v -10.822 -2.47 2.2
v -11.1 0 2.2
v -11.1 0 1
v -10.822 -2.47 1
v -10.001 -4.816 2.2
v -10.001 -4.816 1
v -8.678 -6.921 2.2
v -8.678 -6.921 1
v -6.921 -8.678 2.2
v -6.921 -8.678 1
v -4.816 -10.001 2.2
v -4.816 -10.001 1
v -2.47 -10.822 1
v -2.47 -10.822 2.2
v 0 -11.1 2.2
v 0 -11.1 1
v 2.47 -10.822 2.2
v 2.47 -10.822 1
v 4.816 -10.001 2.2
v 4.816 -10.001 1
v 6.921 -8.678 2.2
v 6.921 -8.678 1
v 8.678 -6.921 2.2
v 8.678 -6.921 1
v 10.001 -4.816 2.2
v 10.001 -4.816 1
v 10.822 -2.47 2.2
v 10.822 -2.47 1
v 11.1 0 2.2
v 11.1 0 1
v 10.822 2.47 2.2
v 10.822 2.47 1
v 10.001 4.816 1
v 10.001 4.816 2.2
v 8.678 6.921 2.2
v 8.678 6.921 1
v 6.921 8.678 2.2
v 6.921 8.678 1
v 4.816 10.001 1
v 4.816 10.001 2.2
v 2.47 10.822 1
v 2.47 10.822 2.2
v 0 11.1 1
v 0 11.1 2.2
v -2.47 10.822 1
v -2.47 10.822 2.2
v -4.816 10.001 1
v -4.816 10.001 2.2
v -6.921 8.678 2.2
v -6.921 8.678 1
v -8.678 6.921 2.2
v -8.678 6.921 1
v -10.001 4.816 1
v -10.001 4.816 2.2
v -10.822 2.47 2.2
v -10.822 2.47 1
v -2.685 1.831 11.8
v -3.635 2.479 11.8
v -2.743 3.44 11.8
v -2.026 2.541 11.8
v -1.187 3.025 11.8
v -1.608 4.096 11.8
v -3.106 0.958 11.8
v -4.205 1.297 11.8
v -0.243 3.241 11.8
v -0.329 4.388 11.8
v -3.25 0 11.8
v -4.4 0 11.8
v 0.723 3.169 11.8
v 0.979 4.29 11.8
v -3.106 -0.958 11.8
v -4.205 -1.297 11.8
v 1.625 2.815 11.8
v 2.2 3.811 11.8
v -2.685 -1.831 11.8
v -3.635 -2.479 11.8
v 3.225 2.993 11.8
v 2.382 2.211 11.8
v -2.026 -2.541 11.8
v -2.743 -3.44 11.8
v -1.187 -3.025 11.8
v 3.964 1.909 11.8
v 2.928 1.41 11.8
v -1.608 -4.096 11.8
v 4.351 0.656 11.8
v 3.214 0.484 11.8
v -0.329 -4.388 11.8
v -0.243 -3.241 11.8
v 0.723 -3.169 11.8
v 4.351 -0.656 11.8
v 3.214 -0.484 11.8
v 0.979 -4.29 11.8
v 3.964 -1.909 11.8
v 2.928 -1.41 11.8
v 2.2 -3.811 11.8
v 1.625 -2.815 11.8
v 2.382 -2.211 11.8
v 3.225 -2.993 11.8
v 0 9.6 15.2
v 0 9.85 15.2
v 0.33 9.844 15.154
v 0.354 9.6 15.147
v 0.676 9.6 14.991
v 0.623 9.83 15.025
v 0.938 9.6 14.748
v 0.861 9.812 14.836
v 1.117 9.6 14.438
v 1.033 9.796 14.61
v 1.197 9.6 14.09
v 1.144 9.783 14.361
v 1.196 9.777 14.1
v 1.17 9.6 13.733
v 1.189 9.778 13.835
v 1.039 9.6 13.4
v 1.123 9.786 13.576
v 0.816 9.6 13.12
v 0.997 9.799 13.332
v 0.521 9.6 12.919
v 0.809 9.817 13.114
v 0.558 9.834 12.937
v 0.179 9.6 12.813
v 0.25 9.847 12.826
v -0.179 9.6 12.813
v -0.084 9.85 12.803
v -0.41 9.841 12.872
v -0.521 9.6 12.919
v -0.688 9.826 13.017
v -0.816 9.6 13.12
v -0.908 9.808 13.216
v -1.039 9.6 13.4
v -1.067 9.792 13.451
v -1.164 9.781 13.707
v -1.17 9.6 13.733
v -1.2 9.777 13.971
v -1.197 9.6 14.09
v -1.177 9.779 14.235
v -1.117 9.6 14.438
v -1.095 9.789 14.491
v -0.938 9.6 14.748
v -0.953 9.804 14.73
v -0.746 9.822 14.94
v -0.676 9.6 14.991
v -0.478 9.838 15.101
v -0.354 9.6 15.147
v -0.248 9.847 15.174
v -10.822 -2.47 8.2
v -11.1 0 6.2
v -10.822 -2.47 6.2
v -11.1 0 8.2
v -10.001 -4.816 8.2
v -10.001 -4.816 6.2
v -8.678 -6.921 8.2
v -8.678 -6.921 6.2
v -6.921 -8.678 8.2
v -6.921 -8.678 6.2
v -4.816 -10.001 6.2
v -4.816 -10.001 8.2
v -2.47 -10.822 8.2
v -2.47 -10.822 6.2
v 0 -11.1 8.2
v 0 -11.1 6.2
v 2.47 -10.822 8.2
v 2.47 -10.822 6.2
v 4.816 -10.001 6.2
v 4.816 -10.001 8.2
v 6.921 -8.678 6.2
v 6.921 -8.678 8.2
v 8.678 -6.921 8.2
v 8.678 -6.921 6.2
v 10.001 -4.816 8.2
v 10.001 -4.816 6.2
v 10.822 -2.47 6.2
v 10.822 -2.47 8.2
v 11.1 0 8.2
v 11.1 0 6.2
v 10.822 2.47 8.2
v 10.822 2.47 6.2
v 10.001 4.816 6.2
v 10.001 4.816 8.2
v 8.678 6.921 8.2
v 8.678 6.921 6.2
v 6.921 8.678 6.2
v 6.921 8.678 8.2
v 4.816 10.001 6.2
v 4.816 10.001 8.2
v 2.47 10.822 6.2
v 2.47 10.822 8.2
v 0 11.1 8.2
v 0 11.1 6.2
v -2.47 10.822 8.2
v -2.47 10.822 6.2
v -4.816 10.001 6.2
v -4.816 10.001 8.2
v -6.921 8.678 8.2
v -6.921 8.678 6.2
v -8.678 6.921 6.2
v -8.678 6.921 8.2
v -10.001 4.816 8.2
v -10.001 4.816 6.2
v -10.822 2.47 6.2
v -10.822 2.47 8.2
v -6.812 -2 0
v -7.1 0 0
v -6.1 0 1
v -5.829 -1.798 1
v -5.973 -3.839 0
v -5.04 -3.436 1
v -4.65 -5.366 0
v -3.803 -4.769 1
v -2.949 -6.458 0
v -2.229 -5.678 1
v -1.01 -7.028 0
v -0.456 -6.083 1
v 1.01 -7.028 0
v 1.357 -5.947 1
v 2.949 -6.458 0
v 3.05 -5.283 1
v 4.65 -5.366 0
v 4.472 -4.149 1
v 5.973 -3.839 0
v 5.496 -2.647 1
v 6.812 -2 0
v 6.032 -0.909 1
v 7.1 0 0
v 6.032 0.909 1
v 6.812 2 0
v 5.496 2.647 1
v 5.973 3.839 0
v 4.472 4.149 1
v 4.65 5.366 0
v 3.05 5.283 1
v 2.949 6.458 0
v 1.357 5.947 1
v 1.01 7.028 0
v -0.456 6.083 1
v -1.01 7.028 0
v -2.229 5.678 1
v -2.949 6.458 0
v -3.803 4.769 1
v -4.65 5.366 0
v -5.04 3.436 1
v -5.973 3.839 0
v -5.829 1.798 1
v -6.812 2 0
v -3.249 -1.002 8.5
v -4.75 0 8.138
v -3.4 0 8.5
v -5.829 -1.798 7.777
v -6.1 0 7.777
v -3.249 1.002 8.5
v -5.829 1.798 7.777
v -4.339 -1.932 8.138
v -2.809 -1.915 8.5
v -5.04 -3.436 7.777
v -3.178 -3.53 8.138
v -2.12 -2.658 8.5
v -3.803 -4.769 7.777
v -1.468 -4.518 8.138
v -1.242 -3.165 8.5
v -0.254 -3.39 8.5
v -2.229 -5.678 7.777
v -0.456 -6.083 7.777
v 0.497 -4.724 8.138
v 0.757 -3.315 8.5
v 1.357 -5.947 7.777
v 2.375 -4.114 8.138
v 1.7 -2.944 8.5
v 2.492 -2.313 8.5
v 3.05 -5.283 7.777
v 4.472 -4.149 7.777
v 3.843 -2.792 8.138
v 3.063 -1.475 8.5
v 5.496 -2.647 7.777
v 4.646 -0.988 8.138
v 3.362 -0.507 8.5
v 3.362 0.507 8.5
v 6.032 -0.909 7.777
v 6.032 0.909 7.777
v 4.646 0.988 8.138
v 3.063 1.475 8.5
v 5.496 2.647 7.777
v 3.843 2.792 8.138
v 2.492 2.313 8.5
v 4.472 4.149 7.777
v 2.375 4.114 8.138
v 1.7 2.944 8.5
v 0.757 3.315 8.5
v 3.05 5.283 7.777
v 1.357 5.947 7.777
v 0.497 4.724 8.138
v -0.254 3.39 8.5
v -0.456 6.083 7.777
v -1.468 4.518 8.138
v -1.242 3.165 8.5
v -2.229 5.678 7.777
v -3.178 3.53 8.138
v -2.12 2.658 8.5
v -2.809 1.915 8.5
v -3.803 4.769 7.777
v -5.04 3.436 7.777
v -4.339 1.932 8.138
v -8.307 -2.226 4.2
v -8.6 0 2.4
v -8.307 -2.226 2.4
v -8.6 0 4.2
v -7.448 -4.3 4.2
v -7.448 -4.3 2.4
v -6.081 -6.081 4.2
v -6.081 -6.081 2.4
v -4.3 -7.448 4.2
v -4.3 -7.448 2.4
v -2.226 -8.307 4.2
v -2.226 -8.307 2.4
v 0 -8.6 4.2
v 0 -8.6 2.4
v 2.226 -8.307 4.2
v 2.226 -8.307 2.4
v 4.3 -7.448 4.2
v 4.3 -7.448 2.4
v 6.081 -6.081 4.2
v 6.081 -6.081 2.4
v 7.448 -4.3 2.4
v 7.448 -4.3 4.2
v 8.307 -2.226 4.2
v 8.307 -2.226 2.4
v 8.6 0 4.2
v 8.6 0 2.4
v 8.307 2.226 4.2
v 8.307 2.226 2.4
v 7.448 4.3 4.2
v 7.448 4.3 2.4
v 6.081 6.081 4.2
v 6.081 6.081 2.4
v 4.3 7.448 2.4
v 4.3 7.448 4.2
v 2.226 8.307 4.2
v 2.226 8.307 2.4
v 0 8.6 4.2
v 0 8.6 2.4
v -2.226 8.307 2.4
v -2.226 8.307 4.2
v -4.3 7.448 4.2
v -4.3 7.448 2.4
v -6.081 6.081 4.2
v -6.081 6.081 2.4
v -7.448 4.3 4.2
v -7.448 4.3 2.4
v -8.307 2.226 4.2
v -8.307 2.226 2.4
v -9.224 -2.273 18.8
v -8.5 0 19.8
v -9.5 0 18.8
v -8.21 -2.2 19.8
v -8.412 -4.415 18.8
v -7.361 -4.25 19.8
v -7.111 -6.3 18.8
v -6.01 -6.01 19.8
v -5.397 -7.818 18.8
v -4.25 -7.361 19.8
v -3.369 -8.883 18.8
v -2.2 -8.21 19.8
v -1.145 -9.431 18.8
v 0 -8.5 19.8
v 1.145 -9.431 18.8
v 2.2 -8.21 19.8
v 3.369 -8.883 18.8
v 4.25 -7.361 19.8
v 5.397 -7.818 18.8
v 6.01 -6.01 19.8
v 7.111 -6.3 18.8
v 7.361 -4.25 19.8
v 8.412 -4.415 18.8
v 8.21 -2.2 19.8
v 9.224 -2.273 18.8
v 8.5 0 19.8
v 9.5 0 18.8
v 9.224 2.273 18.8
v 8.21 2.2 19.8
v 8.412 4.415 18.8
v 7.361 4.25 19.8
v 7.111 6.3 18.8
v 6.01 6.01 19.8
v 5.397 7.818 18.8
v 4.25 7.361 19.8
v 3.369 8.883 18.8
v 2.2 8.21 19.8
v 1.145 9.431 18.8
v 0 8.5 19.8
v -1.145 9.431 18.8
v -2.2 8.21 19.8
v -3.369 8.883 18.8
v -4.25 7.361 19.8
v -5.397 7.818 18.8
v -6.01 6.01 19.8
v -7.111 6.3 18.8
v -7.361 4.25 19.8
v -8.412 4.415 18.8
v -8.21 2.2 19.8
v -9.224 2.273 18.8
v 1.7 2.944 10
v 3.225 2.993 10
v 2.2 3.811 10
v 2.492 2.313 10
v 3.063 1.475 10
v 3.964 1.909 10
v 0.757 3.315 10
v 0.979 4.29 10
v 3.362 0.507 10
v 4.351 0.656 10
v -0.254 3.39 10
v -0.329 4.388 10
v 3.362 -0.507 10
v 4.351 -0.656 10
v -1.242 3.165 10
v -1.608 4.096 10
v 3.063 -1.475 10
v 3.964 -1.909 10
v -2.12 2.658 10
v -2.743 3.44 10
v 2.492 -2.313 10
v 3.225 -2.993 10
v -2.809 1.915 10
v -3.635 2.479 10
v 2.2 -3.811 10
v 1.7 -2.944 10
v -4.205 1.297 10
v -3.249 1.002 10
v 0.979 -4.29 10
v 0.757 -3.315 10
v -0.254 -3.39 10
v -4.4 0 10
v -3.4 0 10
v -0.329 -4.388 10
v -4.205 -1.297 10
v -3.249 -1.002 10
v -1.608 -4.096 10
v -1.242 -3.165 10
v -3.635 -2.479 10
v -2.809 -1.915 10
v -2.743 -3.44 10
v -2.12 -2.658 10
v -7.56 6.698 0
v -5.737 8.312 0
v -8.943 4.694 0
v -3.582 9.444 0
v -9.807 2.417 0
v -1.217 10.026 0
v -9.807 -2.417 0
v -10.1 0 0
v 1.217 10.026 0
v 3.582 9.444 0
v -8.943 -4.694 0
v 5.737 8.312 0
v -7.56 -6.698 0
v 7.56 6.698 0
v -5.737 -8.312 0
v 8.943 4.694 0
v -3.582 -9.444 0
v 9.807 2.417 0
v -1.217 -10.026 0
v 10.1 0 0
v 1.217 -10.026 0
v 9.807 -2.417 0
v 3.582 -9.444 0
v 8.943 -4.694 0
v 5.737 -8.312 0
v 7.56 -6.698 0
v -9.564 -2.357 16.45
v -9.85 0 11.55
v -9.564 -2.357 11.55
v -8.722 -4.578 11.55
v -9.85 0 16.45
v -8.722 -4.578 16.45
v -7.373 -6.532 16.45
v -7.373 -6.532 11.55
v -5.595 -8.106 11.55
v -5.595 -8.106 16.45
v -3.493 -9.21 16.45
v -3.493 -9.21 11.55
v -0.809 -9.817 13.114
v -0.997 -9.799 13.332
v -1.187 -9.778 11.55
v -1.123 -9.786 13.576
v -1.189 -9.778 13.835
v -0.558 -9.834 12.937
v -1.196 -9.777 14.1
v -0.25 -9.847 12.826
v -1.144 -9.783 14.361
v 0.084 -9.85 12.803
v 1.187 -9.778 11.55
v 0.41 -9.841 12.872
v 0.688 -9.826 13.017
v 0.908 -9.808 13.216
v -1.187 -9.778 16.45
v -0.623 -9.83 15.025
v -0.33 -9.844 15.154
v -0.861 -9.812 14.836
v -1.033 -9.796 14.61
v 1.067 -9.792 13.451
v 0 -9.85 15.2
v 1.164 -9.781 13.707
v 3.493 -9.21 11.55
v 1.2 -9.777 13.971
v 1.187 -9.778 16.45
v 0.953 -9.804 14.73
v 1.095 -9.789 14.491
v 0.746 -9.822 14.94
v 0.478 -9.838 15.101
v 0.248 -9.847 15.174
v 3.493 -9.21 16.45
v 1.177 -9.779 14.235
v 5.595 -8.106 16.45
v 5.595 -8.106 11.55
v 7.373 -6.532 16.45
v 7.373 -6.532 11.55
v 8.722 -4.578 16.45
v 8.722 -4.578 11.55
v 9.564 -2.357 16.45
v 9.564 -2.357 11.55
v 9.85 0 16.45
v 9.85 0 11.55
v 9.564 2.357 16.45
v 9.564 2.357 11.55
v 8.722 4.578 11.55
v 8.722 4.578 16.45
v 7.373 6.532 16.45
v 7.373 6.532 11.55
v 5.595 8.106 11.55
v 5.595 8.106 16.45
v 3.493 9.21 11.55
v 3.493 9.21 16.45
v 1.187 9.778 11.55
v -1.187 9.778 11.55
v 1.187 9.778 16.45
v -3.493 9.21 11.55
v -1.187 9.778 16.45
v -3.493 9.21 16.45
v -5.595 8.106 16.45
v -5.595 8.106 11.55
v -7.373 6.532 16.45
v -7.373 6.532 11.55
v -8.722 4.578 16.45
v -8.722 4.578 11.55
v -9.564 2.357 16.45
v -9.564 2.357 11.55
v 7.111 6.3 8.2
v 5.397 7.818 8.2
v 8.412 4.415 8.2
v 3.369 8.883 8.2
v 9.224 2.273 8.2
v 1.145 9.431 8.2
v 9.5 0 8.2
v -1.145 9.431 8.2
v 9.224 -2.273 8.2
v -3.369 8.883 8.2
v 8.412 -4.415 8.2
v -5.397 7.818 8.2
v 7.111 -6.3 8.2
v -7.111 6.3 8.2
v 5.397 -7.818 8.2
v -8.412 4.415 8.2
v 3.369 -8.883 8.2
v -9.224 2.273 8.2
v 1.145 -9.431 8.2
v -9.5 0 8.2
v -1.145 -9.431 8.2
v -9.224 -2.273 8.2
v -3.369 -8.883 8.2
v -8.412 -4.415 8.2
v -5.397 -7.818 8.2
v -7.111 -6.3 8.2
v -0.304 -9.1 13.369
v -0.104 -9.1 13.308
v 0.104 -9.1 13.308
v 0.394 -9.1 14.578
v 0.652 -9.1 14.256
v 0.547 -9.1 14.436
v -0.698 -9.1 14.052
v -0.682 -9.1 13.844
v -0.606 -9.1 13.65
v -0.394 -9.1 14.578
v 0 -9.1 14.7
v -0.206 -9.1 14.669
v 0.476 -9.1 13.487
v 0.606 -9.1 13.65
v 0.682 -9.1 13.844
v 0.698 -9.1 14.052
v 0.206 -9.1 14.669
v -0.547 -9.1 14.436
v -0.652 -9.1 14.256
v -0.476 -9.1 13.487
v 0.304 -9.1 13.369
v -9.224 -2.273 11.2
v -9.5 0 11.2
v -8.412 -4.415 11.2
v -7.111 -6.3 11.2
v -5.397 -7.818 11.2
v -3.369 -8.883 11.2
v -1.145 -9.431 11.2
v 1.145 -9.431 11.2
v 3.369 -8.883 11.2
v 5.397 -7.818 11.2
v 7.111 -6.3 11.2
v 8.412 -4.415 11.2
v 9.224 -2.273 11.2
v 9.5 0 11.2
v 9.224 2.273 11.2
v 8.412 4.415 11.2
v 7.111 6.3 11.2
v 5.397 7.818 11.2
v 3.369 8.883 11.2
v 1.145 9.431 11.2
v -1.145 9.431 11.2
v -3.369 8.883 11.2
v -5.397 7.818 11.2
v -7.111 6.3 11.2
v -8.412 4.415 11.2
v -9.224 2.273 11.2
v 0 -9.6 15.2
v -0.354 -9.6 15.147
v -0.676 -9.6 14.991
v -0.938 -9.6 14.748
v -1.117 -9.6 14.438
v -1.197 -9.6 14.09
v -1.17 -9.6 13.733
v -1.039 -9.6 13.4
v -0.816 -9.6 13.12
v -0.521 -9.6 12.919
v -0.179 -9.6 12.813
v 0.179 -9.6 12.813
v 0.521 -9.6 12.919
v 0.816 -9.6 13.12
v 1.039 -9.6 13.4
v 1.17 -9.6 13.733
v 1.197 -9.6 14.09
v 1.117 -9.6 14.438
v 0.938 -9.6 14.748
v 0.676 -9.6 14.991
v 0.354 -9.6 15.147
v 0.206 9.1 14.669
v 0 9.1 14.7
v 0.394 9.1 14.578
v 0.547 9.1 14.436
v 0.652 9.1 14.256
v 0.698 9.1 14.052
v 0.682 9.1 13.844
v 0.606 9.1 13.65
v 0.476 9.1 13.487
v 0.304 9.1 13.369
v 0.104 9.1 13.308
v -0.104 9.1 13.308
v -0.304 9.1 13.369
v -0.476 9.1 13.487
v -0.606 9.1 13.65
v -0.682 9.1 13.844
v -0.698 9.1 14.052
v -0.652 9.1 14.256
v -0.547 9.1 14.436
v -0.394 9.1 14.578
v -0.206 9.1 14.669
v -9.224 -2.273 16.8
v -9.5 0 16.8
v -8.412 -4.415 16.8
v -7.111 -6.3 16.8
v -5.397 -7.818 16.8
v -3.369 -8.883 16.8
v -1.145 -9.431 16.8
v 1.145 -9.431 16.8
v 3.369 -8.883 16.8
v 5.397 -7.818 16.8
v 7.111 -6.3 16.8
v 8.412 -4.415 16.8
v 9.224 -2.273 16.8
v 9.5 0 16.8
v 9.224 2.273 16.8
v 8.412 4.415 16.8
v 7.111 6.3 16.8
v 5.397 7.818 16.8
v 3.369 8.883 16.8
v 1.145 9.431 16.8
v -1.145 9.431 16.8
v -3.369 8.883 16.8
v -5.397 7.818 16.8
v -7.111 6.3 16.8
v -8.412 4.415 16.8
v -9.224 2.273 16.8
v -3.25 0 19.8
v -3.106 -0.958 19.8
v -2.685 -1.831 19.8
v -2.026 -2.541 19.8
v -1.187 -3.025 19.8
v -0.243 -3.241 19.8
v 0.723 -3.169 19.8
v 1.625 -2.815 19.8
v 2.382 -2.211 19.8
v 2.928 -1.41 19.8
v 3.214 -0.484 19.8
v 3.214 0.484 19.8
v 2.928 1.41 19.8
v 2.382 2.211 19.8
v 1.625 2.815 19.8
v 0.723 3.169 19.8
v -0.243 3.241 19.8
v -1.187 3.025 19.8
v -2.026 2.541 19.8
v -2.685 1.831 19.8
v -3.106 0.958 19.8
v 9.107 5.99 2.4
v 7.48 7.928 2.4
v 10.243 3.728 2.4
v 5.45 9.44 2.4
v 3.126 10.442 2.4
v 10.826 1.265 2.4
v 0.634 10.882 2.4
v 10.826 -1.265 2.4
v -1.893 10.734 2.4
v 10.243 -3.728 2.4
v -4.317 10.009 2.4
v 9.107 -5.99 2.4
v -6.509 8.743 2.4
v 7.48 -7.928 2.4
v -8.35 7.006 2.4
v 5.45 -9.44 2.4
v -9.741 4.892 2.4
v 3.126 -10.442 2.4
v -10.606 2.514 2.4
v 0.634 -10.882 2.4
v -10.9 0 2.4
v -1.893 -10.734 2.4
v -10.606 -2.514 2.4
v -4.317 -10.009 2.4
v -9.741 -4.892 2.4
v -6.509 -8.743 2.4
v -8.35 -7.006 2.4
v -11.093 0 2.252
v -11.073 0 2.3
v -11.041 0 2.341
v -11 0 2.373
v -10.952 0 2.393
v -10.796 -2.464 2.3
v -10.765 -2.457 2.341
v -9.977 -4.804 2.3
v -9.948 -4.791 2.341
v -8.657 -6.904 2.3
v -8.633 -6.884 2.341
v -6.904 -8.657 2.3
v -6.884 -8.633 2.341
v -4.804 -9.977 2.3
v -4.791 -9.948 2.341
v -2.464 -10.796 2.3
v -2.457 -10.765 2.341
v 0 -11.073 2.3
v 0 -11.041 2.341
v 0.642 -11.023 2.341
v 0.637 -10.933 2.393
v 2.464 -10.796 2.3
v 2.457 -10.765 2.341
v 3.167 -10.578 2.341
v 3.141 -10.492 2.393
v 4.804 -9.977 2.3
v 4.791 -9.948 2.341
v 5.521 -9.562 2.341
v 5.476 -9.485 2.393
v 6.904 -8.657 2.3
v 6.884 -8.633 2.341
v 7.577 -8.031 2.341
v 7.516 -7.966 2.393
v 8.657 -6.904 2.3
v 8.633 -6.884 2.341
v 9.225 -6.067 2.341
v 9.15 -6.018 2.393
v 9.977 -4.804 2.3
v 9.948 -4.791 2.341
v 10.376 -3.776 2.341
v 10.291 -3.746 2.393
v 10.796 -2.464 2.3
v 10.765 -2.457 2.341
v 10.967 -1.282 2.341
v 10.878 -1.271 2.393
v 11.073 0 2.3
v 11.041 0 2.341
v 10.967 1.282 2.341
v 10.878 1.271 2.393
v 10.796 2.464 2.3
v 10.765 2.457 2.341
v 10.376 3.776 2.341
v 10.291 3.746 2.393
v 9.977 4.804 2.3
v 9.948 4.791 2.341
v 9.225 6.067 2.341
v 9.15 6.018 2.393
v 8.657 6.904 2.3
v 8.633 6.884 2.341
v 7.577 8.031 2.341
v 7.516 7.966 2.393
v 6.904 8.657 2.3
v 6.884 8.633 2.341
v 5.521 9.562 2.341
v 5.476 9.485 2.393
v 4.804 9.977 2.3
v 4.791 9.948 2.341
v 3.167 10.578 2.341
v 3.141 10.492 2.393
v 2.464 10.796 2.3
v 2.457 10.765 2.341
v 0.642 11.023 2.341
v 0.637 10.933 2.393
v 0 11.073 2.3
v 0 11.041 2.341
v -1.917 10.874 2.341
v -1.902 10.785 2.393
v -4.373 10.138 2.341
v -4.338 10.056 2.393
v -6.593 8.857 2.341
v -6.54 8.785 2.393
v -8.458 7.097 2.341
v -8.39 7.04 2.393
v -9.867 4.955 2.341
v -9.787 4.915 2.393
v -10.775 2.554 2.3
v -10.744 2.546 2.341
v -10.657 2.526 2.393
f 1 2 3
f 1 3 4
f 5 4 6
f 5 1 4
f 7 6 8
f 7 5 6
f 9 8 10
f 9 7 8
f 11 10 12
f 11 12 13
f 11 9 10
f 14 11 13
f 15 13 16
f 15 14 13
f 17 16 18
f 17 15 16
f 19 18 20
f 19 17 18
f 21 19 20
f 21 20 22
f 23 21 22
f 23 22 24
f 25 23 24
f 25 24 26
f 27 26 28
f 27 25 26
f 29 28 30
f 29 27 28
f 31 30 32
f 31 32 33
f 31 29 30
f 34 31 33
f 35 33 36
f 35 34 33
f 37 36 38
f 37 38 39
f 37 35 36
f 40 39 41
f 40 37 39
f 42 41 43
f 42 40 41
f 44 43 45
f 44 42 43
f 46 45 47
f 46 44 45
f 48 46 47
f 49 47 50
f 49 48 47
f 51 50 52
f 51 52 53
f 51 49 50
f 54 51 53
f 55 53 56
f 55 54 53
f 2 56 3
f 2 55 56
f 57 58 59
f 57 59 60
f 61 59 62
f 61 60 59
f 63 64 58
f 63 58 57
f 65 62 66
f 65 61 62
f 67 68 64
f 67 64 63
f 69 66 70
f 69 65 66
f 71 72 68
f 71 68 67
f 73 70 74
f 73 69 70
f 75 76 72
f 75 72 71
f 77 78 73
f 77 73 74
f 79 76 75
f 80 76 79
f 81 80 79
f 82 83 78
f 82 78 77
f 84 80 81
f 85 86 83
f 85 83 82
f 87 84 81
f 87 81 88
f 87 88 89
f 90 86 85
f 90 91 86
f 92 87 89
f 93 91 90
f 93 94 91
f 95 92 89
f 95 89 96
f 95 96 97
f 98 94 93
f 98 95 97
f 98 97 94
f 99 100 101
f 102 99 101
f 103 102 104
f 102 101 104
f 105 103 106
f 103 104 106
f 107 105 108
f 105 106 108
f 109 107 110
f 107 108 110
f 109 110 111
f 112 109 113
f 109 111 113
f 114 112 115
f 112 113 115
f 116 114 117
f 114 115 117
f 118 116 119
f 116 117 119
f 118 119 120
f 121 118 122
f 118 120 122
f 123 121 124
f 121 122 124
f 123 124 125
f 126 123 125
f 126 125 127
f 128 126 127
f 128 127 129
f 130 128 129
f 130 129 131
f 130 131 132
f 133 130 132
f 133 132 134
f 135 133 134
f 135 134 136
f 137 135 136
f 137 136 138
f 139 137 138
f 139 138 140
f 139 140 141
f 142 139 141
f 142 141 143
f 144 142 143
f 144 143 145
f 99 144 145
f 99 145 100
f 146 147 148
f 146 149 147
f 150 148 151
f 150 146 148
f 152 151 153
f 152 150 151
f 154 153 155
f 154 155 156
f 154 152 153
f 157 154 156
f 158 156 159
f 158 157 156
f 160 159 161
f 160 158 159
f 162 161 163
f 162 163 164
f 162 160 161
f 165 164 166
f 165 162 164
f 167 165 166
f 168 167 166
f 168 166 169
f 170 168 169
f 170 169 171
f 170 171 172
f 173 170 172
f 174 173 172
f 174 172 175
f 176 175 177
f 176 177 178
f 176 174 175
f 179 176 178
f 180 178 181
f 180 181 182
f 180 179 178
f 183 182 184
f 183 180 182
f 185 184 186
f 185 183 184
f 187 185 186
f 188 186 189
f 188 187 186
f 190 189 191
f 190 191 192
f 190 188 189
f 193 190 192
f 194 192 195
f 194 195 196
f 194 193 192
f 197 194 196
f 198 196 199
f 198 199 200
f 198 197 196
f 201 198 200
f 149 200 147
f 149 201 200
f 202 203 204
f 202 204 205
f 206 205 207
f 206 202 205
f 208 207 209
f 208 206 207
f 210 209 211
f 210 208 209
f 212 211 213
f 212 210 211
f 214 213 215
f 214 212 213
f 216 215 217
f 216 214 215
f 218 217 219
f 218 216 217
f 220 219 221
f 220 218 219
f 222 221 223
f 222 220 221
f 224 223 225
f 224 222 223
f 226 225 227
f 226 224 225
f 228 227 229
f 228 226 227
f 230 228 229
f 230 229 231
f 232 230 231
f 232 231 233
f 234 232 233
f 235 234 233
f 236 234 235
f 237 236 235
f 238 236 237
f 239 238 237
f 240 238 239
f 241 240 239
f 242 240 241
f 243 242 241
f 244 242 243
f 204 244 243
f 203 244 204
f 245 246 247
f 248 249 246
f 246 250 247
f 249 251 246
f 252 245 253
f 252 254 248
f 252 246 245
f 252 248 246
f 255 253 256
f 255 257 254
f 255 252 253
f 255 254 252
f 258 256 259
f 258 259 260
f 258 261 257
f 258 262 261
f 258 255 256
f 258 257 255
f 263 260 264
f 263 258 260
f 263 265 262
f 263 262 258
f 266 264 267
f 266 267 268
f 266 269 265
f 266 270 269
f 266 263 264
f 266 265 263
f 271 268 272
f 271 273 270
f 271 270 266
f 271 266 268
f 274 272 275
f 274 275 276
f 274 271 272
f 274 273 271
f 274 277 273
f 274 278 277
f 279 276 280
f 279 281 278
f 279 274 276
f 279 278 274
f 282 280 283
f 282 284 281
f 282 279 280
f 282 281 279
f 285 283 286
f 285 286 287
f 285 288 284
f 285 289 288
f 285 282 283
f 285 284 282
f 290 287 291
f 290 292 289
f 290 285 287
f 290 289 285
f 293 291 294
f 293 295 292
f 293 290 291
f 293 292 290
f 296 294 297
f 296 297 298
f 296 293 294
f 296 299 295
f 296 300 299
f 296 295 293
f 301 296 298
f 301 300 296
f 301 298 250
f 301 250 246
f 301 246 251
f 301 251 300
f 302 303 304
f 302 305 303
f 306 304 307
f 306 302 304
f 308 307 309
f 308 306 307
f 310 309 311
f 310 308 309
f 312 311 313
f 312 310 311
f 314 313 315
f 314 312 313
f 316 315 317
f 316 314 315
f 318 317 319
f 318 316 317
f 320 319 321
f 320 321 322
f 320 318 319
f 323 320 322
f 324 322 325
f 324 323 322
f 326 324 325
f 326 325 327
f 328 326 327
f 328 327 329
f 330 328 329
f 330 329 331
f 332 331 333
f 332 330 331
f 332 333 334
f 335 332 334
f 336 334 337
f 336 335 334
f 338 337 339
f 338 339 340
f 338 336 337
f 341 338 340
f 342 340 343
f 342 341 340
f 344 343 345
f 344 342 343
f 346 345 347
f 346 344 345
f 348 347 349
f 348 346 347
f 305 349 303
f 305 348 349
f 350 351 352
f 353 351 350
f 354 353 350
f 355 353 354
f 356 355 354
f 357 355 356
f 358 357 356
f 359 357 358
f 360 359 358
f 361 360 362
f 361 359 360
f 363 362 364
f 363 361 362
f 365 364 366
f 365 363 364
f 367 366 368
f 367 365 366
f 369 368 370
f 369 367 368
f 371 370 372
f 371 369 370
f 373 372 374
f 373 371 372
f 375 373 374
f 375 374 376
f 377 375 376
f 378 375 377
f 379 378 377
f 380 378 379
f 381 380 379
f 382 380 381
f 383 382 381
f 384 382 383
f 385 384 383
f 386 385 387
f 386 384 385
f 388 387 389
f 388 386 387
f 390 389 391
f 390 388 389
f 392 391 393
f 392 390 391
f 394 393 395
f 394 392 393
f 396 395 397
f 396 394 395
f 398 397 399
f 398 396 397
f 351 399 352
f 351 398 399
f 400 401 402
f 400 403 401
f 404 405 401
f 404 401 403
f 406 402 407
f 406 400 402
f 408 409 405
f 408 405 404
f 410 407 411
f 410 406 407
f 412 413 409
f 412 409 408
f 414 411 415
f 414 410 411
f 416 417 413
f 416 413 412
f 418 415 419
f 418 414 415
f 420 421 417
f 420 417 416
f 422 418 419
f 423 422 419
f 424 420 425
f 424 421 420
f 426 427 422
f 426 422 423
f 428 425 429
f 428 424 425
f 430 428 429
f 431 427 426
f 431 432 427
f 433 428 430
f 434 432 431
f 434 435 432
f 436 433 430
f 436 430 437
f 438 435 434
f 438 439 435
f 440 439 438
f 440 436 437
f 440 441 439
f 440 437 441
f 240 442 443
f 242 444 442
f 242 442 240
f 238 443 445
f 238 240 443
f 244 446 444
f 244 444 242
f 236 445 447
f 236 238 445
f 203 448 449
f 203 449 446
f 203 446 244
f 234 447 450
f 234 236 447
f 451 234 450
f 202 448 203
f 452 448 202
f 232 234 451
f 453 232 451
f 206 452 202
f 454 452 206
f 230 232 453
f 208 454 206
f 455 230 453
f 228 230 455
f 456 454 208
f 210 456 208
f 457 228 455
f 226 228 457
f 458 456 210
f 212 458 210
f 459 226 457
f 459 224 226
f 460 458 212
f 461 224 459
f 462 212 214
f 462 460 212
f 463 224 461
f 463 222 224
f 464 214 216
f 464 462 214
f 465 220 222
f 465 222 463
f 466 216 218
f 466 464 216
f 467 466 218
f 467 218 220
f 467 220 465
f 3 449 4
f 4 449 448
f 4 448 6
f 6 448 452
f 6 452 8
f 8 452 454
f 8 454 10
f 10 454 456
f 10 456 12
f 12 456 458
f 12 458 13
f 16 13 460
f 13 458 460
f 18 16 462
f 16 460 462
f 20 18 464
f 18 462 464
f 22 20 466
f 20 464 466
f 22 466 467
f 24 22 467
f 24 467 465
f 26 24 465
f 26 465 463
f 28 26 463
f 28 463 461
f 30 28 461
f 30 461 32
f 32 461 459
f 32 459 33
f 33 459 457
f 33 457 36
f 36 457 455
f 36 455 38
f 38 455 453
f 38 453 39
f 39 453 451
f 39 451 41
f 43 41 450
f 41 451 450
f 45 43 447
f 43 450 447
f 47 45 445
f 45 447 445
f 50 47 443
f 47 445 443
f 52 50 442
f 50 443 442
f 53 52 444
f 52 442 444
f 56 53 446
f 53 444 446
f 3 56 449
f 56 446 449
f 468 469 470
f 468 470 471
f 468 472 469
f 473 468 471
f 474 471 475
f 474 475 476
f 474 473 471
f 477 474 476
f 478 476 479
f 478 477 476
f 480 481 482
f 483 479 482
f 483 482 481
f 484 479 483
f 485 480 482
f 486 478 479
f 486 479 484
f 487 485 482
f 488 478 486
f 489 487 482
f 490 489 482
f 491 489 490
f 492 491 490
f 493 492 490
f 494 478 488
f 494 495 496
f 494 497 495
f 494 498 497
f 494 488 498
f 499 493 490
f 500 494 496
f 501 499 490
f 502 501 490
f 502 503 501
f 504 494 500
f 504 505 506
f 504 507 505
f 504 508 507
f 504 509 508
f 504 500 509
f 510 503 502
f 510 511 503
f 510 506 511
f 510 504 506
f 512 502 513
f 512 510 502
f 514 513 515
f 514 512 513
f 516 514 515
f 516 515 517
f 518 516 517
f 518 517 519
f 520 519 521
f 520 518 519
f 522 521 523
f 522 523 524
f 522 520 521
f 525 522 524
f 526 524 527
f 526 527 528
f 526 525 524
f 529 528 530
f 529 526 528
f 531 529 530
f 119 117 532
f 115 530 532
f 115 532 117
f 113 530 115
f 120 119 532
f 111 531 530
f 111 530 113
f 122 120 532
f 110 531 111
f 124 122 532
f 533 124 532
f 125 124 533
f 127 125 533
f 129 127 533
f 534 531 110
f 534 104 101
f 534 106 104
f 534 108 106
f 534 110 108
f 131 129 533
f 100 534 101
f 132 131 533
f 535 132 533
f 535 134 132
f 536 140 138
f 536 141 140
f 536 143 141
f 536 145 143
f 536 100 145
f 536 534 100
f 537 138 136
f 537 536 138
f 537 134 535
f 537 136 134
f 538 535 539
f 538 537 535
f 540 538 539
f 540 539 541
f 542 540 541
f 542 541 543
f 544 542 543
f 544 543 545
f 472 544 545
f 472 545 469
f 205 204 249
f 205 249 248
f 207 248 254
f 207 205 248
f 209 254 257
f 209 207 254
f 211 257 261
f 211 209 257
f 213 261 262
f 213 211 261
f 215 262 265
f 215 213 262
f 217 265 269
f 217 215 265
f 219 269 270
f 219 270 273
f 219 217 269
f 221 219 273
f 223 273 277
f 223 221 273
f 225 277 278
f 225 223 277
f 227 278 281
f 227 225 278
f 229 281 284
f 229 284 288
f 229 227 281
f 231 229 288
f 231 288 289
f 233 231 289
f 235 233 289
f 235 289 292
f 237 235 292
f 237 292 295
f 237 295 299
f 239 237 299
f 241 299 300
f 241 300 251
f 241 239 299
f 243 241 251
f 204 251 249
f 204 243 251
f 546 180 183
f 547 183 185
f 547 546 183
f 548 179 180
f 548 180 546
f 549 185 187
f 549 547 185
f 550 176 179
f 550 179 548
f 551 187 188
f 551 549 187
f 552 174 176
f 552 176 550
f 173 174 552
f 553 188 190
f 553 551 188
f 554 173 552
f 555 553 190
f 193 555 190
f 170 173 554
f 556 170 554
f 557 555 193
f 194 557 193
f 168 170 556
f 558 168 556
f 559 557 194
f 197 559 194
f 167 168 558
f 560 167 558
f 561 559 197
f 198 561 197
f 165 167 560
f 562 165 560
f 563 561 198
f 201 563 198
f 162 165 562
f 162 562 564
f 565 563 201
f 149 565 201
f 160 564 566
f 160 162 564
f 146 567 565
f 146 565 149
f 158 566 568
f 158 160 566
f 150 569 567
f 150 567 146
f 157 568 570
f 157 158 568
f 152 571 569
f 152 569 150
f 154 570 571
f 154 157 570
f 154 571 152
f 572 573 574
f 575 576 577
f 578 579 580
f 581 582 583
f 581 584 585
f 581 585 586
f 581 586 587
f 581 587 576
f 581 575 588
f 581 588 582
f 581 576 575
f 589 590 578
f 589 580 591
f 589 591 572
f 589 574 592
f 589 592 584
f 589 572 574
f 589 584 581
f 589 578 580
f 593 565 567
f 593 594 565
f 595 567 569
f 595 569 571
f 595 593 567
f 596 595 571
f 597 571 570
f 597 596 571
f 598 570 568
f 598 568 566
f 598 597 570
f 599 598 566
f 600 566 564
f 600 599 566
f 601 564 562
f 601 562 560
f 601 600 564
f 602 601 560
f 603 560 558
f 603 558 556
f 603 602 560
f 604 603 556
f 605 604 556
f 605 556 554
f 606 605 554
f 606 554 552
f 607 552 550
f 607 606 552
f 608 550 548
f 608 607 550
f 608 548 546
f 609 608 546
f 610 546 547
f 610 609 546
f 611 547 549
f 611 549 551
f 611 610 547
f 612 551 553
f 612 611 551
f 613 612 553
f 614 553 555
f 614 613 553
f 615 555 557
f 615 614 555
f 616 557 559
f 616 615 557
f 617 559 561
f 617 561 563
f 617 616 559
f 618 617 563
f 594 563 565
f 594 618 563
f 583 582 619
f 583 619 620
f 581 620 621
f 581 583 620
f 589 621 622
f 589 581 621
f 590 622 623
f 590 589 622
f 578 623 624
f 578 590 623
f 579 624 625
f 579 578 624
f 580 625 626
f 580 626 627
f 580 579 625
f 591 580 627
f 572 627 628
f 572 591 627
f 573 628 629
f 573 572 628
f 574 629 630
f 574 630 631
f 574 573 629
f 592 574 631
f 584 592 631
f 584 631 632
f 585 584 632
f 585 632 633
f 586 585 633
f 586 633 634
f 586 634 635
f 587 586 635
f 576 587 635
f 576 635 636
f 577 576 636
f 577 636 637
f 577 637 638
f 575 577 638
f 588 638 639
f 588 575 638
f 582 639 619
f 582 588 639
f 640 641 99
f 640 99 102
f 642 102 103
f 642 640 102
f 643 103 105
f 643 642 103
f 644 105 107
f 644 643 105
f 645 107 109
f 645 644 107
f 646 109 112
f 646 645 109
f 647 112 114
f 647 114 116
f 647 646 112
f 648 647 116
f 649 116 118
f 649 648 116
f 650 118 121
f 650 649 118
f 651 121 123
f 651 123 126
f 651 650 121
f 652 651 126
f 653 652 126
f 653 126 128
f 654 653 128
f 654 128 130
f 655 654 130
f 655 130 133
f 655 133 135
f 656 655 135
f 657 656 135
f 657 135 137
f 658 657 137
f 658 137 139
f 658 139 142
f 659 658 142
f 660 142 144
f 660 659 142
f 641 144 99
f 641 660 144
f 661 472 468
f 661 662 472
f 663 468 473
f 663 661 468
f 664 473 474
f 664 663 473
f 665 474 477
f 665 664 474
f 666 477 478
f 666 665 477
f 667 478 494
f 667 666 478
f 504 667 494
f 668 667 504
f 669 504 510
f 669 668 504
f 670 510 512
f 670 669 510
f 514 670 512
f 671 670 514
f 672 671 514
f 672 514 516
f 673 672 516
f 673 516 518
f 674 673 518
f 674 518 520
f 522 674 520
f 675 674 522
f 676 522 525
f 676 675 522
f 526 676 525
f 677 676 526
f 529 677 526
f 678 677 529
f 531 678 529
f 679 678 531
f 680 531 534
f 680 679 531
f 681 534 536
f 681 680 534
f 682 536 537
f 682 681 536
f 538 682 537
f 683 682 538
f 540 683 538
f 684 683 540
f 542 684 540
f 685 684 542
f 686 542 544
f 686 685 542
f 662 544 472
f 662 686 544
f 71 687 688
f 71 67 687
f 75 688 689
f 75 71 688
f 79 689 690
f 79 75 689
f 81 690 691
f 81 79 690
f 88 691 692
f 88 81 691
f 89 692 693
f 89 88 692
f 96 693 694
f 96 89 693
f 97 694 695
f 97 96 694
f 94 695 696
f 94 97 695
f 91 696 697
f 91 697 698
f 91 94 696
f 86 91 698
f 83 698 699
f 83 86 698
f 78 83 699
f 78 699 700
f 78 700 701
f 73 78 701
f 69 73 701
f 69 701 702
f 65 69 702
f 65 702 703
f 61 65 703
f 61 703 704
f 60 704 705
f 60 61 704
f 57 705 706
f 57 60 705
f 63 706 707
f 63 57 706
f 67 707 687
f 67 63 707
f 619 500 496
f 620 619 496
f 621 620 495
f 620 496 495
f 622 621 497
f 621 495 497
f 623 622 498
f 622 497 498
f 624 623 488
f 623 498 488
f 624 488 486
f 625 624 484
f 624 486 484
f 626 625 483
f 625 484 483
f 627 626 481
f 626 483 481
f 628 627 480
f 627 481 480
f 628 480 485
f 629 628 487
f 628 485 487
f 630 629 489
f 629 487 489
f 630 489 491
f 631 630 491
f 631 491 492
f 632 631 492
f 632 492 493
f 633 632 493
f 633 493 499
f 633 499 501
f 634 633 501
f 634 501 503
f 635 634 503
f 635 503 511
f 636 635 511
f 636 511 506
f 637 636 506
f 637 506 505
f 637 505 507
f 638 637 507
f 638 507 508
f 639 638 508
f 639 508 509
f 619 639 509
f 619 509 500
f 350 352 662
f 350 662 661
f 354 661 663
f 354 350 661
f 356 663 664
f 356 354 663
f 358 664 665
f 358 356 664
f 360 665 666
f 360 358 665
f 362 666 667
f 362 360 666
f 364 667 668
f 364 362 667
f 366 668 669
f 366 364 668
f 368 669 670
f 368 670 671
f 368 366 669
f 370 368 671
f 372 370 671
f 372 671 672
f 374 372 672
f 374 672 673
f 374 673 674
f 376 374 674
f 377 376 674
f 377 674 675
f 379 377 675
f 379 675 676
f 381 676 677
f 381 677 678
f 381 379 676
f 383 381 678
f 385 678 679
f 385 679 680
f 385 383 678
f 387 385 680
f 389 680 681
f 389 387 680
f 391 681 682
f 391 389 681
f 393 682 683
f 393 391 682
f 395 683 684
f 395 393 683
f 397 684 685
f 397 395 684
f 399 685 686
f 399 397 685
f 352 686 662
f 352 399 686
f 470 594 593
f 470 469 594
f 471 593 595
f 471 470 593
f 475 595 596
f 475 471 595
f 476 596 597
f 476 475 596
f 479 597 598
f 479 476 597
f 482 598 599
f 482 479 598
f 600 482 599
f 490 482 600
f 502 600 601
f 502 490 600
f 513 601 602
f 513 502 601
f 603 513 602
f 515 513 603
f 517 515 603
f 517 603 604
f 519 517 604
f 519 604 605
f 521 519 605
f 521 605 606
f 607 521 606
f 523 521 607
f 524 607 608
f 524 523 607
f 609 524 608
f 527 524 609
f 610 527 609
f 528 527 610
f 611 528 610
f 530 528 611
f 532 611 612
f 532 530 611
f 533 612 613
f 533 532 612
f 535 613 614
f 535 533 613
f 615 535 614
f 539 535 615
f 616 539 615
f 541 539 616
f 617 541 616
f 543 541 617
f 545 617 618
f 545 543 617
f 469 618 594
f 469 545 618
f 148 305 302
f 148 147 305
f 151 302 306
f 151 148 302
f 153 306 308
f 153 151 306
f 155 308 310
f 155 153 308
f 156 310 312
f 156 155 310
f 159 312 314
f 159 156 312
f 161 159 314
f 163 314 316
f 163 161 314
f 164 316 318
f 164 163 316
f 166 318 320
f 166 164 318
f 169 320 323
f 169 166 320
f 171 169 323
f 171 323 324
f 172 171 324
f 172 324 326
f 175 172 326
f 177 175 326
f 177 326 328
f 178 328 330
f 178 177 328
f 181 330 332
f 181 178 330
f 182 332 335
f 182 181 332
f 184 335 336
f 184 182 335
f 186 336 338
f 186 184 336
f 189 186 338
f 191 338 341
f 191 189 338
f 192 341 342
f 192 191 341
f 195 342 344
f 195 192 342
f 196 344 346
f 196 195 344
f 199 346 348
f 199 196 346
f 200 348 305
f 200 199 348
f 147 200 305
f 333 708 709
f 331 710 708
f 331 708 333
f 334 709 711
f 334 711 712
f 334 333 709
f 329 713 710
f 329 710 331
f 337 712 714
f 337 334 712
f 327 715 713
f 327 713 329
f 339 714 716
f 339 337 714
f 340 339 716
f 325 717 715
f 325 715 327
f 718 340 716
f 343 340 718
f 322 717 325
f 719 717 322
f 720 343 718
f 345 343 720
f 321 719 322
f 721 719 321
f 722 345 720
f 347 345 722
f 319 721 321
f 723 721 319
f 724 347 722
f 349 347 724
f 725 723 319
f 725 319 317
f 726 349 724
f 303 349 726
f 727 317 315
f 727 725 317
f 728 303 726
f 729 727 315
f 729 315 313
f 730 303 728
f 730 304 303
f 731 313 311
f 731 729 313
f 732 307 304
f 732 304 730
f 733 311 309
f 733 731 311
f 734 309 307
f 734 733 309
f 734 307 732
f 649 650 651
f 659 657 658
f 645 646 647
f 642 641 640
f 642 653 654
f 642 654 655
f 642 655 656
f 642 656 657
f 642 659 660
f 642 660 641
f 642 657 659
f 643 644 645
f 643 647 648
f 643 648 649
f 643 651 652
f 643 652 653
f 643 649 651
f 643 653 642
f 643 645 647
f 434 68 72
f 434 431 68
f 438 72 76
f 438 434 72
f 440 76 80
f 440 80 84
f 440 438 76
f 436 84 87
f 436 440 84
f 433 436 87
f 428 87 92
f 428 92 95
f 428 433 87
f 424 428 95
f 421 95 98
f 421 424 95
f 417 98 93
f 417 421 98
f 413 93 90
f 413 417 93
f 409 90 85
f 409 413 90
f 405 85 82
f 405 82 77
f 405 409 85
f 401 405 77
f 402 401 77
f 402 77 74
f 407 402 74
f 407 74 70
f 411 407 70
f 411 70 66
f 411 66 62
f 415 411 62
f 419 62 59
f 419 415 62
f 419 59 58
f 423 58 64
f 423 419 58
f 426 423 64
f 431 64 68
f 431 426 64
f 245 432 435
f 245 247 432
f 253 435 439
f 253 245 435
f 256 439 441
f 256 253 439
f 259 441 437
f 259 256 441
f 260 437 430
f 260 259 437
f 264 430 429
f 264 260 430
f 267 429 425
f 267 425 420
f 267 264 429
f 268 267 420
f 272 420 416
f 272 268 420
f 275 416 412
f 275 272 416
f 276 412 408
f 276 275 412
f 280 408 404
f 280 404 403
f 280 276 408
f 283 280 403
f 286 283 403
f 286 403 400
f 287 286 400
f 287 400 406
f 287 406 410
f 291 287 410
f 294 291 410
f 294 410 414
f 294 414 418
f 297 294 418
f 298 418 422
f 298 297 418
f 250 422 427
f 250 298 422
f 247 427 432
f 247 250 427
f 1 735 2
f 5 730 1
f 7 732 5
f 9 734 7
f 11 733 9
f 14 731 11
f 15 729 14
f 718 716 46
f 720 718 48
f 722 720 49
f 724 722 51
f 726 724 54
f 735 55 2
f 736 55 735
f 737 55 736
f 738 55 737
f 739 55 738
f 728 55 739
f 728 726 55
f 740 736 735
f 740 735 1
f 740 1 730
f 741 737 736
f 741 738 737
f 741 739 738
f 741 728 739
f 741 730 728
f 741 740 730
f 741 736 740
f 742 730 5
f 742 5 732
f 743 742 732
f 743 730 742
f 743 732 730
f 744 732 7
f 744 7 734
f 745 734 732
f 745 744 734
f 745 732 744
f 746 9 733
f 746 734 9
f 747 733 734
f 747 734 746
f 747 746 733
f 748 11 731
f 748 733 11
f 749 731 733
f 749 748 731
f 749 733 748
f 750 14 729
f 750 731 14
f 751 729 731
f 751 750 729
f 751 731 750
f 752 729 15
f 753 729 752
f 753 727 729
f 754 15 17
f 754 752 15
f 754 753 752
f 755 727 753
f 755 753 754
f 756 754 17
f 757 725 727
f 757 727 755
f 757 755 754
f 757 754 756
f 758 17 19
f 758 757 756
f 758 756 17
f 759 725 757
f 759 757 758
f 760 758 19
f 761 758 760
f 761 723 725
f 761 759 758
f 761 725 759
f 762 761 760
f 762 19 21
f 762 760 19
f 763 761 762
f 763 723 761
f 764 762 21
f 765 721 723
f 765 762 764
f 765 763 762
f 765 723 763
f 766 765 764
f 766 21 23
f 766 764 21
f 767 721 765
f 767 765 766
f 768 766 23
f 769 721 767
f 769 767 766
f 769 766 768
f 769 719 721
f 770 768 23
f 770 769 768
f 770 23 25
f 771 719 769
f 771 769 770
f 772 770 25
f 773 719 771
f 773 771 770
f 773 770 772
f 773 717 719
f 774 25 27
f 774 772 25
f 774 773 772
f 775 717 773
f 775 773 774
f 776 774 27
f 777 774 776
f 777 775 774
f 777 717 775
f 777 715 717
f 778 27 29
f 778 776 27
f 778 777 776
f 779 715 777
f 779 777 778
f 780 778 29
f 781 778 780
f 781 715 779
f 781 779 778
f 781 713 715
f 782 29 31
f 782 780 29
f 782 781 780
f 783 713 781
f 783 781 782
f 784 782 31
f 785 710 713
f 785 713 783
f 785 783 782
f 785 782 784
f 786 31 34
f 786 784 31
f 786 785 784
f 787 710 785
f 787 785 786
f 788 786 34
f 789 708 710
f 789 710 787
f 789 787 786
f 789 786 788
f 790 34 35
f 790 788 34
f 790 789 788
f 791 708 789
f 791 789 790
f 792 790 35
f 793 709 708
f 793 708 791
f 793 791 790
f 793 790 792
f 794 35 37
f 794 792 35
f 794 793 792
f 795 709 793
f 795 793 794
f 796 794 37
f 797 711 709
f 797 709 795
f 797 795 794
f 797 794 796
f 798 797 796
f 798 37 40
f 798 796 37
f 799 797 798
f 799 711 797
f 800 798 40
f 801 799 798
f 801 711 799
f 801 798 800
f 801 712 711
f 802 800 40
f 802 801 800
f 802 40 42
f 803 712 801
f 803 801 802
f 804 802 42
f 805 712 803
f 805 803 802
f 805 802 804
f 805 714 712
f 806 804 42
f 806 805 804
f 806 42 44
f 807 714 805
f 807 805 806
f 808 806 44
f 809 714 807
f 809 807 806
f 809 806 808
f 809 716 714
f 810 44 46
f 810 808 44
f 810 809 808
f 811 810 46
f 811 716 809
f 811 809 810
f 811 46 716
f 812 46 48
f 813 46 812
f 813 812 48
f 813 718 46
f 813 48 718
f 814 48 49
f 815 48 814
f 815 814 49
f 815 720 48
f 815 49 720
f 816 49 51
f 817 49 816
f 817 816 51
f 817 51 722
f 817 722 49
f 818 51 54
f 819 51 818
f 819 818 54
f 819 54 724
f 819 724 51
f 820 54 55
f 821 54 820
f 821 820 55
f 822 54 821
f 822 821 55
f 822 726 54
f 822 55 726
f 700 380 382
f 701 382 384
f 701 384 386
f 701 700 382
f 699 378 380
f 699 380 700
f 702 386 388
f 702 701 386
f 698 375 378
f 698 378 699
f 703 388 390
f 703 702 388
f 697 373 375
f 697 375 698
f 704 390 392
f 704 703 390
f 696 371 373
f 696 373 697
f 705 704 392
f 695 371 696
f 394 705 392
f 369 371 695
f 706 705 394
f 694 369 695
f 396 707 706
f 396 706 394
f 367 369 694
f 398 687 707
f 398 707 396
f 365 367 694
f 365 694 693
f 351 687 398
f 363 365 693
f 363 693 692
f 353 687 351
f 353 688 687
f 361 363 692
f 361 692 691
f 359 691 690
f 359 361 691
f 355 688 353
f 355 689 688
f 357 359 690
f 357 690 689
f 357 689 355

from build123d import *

# Parameters (mm, degrees)
CHAMFER_1_SIZE                       = 1
CHAMFER_2_SIZE                       = 1
FILLET_1_R                           = 0.2
SKETCH_5_R                           = 1.2
CUT_EXTRUDE_2_DEPTH                  = 2
CHAMFER_3_SIZE                       = 0.5
PATTERN_CIRCULAR_1_COUNT             = 2
CHAMFER_3_OF_PATTERN_CIRCULAR_1_SIZE = 0.5


with BuildPart() as part:
    # 스케치3 → 회전2 (revolve)
    with BuildSketch(Plane(origin=(0, 0, 0), x_dir=(1, 0, 0), z_dir=(0, 1, 0)), mode=Mode.PRIVATE) as revolve_2_sk:
        Polygon((11.1, 0), (11.1, -2.4), (8.6, -2.4), (8.6, -4.2), (11.1, -6.2), (11.1, -8.2), (9.5, -8.2), (9.5, -11.2), (9.85, -11.55), (9.85, -16.45), (9.5, -16.8), (9.5, -19.8), (3.25, -19.8), (3.25, -11.8), (4.4, -11.8), (4.4, -10), (3.4, -10), (3.4, -8.5), (6.1, -7.77653718), (6.1, 0), align=None)
    revolve(revolve_2_sk.sketch.rotate(Axis((0, 0, 0), (0, 0, 1)), 180), axis=Axis((0, 0, 0), (0, 0, 1)))

    # 모따기1
    chamfer_1_edges = [part.edges().sort_by_distance(p)[0] for p in [
        (9.5, 0, 19.8),
        (6.1, 0, 0),
    ]]
    chamfer(chamfer_1_edges, length=CHAMFER_1_SIZE)

    # 모따기2
    chamfer_2_edges = [part.edges().sort_by_distance(p)[0] for p in [
        (11.1, 0, 0),
    ]]
    chamfer(chamfer_2_edges, length=CHAMFER_2_SIZE)

    # 필렛1
    fillet_1_edges = [part.edges().sort_by_distance(p)[0] for p in [
        (11.1, 0, 2.4),
    ]]
    fillet(fillet_1_edges, radius=FILLET_1_R)

    # 스케치5 → 컷-돌출2 (cut)
    with BuildSketch(Plane(origin=(0, 11.1, 0), x_dir=(1, 0, 0), z_dir=(0, 1, 0))):
        with Locations(Location((0, -14, 0), (0, 0, 270))):
            Circle(SKETCH_5_R)
    cut_extrude_2 = extrude(amount=-CUT_EXTRUDE_2_DEPTH, mode=Mode.SUBTRACT)

    # 모따기3
    chamfer_3_edges = [part.edges().sort_by_distance(p)[0] for p in [
        (0, 9.1, 12.8),
    ]]
    chamfer(chamfer_3_edges, length=CHAMFER_3_SIZE)

    # 원형 패턴1: 컷-돌출2 ×2 about axis
    pattern_circular_1_axis = Axis((0, 0, 0), (0, 0, -1))
    for i in range(1, PATTERN_CIRCULAR_1_COUNT):
        add(cut_extrude_2.rotate(pattern_circular_1_axis, i * 360 / PATTERN_CIRCULAR_1_COUNT), mode=Mode.SUBTRACT)

    # 모따기3 of 원형 패턴1
    chamfer_3_of_pattern_circular_1_edges = [part.edges().sort_by_distance(p)[0] for p in [
        (0, -9.1, 12.8),
    ]]
    chamfer(chamfer_3_of_pattern_circular_1_edges, length=CHAMFER_3_OF_PATTERN_CIRCULAR_1_SIZE)


solid = part.part
